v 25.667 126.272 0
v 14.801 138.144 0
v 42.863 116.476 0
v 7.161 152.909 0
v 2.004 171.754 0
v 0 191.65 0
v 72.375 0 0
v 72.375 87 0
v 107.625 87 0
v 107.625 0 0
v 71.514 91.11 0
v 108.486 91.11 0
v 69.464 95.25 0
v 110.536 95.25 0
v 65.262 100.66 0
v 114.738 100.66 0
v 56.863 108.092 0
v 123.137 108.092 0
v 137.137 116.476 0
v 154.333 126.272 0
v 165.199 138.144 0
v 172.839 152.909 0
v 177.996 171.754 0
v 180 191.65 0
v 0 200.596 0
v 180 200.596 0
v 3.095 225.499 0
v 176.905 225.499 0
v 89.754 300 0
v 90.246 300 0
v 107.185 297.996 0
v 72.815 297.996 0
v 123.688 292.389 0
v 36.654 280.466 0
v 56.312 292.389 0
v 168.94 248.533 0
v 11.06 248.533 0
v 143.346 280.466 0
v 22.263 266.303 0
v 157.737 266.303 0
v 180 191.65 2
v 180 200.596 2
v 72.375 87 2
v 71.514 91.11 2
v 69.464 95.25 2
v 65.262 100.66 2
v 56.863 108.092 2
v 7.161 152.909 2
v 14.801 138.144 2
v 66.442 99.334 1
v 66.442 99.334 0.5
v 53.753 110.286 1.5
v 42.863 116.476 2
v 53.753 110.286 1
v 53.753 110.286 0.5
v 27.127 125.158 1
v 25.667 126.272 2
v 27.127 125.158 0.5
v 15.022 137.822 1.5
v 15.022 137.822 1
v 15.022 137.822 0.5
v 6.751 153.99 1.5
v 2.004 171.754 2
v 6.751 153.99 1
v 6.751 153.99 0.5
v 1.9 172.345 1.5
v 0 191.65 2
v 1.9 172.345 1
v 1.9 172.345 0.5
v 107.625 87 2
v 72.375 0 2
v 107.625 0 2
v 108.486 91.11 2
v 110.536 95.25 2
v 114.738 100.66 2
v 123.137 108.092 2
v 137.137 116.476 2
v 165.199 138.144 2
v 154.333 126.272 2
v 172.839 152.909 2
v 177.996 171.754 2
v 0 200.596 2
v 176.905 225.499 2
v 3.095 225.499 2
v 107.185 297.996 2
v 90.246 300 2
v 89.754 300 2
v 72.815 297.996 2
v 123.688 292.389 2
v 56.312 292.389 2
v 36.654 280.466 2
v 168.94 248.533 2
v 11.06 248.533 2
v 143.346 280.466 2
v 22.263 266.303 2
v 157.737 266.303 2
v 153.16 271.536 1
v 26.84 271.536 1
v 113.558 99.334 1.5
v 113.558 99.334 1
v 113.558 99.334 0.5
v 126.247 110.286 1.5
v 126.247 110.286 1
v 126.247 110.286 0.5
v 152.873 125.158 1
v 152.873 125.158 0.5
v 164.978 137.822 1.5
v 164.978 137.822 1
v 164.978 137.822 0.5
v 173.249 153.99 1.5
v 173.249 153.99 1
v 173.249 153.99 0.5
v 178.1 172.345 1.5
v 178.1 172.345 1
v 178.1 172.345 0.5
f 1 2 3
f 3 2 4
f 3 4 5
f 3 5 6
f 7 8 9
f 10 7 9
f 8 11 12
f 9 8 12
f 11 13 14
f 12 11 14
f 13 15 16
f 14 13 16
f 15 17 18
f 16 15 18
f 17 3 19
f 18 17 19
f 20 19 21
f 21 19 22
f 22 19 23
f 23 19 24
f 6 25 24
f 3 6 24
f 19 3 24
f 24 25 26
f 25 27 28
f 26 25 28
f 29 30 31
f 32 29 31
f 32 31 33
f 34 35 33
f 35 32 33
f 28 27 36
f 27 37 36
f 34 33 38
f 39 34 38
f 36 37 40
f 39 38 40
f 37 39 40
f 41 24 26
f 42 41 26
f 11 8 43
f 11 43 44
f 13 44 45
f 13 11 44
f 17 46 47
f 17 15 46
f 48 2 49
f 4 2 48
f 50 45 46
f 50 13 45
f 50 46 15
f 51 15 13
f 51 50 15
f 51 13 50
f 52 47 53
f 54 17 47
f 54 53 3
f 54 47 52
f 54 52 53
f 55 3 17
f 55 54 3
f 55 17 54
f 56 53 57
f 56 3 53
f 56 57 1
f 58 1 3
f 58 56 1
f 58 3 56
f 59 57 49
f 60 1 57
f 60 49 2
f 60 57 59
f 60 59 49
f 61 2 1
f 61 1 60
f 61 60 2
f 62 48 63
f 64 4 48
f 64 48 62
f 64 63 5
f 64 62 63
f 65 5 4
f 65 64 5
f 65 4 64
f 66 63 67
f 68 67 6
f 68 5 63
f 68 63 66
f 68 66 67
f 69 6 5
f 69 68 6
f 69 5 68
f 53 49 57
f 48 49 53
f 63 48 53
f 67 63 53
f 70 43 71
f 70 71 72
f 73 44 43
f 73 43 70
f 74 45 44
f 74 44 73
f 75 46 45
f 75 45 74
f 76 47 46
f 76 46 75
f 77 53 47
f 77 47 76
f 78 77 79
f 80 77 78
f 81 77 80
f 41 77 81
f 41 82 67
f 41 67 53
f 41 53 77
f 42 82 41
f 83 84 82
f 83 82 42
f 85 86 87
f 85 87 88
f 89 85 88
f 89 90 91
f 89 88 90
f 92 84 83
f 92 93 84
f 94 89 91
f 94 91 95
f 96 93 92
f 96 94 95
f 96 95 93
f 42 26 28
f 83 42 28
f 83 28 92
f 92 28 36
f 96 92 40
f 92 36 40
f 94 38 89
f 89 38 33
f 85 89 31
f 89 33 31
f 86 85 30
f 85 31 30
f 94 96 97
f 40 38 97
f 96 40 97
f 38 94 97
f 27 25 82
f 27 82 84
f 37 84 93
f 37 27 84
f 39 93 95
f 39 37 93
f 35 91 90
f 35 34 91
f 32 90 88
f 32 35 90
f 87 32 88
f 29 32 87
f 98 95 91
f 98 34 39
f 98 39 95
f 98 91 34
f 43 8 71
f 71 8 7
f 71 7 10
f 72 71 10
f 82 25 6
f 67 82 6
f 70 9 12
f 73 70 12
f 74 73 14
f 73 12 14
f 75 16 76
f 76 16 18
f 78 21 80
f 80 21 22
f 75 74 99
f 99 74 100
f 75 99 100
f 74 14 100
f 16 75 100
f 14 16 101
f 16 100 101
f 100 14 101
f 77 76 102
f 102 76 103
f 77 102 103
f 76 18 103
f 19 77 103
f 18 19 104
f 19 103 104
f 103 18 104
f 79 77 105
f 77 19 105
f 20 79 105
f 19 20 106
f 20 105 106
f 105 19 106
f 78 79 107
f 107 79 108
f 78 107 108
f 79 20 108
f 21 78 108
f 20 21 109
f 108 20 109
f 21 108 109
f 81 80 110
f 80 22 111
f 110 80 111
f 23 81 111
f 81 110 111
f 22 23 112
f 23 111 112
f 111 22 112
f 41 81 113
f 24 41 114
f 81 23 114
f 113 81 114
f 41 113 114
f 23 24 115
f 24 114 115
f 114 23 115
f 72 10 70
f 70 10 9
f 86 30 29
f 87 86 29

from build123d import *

# Parameters (mm, degrees)
BOSS_EXTRUDE2_DEPTH = 2


with BuildPart() as part:
    # Sketch1 → Boss-Extrude2 (new body)
    with BuildSketch(Plane.XY):
        with BuildLine():
            Line((72.374737303, 86.999859647), (72.374737303, 0))
            Line((72.374737303, 0), (107.625262697, 0))
            Line((107.625262697, 0), (107.625262697, 86.999859647))
            add(Edge.make_bspline(
                [(107.625262697, 86.999859647), (108.054143272, 95.978078118), (127.486643852, 113.866261667), (148.895297768, 121.069134621), (172.848320314, 142.893766889), (179.3317341, 169.378414193), (180, 191.65032035)],
                knots=[0, 0, 0, 0, 0.116860668, 0.211663242, 0.246387134, 0.464099584, 0.464099584, 0.464099584, 0.464099584], degree=3))
            Line((180, 191.65032035), (180, 200.595525294))
            add(Edge.make_bspline(
                [(180, 200.595525294), (179.179346149, 227.438302674), (163.29910964, 275.970123499), (113.184129082, 299.959310061), (90.245728189, 300)],
                knots=[0.493370629, 0.493370629, 0.493370629, 0.493370629, 0.75821873, 0.999139583, 0.999139583, 0.999139583, 0.999139583], degree=3))
            Line((90.245728189, 300), (90, 300))
            Line((90, 300), (89.754271811, 300))
            add(Edge.make_bspline(
                [(0, 200.595525294), (0.820653851, 227.438302674), (16.70089036, 275.970123499), (66.815870918, 299.959310061), (89.754271811, 300)],
                knots=[0.493370629, 0.493370629, 0.493370629, 0.493370629, 0.75821873, 0.999139583, 0.999139583, 0.999139583, 0.999139583], degree=3))
            Line((0, 200.595525294), (0, 191.65032035))
            add(Edge.make_bspline(
                [(72.374737303, 86.999859647), (71.945856728, 95.978078118), (52.513356148, 113.866261667), (31.104702232, 121.069134621), (7.151679686, 142.893766889), (0.6682659, 169.378414193), (0, 191.65032035)],
                knots=[0, 0, 0, 0, 0.116860668, 0.211663242, 0.246387134, 0.464099584, 0.464099584, 0.464099584, 0.464099584], degree=3))
        make_face()
    extrude(amount=BOSS_EXTRUDE2_DEPTH)


solid = part.part
